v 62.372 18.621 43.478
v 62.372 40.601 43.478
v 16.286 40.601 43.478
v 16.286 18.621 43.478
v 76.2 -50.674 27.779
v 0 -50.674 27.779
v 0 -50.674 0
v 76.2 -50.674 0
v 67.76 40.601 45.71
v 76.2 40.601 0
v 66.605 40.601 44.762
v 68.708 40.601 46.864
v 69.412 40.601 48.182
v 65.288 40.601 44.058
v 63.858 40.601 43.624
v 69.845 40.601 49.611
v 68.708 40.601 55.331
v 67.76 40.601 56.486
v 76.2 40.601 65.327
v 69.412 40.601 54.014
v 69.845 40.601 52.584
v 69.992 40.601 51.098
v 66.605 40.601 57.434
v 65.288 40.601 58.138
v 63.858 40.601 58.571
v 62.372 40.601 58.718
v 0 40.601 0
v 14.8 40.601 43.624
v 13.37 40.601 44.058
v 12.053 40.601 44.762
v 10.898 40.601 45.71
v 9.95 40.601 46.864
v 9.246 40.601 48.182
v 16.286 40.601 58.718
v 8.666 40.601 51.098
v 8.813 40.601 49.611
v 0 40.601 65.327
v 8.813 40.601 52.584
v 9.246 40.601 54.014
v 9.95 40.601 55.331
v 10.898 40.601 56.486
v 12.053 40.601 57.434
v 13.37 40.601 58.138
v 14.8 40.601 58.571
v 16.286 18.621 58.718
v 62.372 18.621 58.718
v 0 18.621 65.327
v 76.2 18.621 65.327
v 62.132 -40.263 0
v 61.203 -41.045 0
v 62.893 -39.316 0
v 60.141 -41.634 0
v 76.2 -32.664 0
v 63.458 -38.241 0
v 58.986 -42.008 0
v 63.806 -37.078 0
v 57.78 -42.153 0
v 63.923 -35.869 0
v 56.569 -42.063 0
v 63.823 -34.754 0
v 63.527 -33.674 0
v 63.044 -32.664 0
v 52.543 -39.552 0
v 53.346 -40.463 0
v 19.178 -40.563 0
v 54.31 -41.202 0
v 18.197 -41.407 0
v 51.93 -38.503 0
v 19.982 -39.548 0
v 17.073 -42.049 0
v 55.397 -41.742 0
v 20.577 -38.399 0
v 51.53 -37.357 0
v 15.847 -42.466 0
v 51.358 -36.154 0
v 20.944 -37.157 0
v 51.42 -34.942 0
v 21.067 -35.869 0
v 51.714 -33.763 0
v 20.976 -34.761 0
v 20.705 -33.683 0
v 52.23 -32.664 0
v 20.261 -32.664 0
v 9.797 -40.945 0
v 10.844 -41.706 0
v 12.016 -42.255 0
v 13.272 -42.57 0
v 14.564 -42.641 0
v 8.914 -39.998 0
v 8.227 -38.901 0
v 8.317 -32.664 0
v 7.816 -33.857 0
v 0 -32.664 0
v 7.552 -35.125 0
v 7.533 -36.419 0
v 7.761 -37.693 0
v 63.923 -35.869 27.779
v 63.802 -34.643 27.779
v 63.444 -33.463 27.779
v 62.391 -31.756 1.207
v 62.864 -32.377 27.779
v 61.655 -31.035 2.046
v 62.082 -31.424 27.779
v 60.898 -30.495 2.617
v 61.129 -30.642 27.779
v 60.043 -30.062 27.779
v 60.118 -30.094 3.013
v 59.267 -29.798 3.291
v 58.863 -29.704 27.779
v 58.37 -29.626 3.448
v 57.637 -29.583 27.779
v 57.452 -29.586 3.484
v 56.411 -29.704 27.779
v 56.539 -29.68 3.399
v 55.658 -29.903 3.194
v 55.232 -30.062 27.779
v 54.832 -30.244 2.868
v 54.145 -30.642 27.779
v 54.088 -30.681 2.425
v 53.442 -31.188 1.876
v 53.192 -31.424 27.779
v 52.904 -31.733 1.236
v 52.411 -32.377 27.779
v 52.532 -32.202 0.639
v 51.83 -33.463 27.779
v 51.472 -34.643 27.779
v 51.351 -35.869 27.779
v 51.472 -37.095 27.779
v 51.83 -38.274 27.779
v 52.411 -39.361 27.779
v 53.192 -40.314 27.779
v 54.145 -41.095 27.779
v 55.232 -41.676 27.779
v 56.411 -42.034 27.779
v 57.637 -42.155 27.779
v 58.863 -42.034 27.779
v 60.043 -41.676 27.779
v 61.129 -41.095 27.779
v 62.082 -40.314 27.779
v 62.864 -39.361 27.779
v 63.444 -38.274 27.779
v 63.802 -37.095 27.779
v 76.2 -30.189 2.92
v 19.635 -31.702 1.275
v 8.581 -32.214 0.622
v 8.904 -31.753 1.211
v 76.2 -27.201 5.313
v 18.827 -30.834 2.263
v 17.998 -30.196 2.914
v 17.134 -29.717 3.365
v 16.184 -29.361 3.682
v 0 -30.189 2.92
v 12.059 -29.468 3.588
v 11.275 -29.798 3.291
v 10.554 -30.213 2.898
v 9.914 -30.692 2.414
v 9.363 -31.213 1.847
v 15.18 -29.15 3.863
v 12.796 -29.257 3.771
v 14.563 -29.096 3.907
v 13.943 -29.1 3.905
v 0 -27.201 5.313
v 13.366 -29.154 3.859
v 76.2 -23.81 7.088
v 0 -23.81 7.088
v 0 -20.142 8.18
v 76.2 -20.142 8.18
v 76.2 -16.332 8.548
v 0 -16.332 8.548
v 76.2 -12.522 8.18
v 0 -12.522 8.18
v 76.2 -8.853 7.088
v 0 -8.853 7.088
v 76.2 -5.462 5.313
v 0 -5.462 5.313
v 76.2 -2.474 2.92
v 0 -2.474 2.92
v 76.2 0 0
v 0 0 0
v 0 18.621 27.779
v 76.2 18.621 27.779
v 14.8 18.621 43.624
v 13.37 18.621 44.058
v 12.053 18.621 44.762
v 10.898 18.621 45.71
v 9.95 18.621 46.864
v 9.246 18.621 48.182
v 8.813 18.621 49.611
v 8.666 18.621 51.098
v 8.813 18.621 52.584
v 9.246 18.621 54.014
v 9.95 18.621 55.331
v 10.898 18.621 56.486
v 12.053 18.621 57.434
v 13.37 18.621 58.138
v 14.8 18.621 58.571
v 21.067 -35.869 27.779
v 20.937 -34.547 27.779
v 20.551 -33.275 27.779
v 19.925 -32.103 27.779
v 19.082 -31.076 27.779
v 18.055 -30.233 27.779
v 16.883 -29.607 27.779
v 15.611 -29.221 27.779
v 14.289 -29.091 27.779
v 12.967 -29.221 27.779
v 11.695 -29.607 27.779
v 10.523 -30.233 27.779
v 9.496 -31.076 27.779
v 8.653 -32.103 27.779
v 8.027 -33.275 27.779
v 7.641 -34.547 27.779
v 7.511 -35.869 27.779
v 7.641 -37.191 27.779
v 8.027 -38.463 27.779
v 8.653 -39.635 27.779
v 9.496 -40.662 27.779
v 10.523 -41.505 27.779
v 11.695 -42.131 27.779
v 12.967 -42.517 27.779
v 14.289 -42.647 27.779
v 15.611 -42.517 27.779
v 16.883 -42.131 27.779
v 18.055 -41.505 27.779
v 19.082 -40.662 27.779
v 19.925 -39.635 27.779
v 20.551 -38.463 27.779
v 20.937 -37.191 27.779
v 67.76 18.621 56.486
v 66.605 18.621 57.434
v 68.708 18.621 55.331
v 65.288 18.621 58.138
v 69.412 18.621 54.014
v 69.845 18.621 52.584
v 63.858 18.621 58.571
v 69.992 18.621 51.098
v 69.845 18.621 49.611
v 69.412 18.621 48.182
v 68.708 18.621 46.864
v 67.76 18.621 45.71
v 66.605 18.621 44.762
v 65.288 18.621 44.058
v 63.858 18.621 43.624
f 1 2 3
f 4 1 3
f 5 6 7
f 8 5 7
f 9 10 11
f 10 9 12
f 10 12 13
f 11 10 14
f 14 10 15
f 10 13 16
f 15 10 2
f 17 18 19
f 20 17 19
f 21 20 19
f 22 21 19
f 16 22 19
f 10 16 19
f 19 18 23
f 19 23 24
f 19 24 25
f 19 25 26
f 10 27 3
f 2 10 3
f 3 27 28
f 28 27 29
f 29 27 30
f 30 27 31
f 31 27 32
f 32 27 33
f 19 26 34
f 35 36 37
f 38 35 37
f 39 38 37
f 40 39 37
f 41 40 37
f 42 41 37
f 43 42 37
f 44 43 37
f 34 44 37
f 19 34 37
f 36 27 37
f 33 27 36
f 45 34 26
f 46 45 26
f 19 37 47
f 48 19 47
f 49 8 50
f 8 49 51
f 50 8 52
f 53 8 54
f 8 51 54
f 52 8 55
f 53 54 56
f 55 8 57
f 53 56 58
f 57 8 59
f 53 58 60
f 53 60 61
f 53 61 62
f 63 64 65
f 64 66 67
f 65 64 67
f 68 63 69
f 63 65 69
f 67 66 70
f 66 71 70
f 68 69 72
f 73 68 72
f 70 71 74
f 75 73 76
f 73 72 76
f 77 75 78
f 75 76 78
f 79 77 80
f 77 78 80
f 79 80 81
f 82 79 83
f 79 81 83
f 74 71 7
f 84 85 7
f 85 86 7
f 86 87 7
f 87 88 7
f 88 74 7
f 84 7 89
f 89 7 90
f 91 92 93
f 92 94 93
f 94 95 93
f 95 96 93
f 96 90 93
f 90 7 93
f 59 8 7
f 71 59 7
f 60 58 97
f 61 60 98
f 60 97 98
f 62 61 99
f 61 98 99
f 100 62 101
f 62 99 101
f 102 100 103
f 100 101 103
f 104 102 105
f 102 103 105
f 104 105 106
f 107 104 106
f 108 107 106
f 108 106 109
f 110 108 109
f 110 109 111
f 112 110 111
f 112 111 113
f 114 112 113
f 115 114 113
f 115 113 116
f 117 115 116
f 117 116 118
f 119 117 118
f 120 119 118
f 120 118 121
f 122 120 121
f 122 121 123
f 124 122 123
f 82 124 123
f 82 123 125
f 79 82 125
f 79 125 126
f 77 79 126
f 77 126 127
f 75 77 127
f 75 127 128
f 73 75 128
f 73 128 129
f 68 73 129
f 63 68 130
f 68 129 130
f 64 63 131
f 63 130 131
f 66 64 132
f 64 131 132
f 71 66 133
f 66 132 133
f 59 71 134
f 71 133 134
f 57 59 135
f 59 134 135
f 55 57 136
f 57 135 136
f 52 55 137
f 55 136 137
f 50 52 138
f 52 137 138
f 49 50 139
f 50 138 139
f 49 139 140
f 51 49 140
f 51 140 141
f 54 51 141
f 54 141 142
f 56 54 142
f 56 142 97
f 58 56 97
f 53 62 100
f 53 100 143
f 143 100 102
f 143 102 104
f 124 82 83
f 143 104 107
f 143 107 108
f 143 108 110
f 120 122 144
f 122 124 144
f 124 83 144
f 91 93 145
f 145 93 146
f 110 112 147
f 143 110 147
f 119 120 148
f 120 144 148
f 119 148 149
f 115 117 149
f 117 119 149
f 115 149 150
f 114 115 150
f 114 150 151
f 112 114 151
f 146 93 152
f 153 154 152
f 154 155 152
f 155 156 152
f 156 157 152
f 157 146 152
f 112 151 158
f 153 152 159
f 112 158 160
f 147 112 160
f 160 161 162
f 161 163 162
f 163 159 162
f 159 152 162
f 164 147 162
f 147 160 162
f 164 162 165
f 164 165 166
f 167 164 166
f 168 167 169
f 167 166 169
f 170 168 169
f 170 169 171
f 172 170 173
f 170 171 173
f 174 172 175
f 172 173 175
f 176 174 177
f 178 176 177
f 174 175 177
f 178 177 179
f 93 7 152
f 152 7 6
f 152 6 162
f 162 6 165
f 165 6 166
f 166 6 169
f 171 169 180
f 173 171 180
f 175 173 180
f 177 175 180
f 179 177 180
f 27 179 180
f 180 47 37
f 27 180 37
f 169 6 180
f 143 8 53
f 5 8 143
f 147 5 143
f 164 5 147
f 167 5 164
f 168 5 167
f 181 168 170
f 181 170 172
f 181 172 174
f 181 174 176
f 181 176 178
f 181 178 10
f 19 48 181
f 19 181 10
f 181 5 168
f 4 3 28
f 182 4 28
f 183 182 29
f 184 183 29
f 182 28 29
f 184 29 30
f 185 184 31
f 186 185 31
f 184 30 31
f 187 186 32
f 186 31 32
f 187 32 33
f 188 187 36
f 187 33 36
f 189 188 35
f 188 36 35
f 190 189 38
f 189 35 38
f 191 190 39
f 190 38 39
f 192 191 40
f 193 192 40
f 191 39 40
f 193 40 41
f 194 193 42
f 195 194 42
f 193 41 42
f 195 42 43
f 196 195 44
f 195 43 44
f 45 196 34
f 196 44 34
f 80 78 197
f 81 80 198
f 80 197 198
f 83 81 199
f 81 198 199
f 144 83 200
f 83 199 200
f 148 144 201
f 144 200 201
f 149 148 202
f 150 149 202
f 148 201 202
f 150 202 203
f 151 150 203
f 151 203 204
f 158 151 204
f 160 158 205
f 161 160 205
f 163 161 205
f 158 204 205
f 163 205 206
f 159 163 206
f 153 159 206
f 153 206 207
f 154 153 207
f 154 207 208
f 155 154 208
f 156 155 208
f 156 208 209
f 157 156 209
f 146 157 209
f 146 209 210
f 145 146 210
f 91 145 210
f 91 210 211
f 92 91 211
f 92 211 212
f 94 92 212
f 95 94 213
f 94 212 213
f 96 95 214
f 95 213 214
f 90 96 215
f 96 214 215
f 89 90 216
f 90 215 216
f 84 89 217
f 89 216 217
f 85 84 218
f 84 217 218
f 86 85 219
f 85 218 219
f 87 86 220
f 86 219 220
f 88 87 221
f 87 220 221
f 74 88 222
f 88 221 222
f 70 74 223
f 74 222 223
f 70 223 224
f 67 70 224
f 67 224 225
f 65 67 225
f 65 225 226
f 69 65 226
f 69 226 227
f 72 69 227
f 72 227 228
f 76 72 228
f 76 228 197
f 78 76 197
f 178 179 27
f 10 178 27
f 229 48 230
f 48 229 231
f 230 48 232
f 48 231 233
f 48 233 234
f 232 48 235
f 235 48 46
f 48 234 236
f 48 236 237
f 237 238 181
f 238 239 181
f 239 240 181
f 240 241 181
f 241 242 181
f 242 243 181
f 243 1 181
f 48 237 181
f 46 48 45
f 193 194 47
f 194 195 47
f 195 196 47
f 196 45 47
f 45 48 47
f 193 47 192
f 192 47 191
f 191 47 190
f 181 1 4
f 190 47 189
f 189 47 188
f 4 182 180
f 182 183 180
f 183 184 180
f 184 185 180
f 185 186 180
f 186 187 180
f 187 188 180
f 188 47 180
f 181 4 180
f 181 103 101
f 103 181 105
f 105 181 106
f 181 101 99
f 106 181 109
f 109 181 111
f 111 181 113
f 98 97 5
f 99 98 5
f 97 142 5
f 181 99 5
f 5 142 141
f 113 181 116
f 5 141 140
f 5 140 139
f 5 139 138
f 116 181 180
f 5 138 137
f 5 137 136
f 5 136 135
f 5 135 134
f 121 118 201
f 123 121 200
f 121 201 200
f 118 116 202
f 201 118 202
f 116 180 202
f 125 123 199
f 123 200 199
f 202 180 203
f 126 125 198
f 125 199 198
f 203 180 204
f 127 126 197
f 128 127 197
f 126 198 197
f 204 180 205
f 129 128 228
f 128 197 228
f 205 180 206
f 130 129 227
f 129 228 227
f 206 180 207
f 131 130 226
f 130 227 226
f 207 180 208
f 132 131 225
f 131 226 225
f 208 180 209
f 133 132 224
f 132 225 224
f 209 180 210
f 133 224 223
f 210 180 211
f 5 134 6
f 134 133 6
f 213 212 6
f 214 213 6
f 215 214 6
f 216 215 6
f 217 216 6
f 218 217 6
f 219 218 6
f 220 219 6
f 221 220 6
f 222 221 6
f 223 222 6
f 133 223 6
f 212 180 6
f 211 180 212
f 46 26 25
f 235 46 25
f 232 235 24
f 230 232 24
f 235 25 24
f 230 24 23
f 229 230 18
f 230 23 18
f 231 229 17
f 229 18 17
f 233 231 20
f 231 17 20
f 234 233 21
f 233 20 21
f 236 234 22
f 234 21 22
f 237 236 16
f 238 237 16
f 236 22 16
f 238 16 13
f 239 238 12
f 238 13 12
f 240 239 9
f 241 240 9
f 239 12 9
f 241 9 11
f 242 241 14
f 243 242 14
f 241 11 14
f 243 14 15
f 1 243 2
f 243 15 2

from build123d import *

# Parameters (mm, degrees)
F1_DEPTH = 76.2
F2_R     = 6.778033
F2_R_2   = 6.285837
F3_DEPTH = 63.246
F5_DEPTH = 25.4


with BuildPart() as f1:
    # F0 (on Right) → F1 (new body)
    with BuildSketch(Plane.YZ):
        with BuildLine():
            ThreePointArc((-32.663602, 0), (-16.331801, 8.548074), (0, 0))
            Line((0, 0), (18.621311, 0))
            Line((18.621311, 0), (40.600557, 0))
            Line((40.600557, 0), (40.600557, 65.327212))
            Line((40.600557, 65.327212), (18.621311, 65.327212))
            Line((18.621311, 65.327212), (18.621311, 27.779331))
            Line((18.621311, 27.779331), (-50.674375, 27.779331))
            Line((-50.674375, 27.779331), (-50.674375, 0))
            Line((-50.674375, 0), (-32.663602, 0))
        make_face()
    extrude(amount=F1_DEPTH)

    # F2 (on face) → F3 (cut)
    with BuildSketch(Plane.XY.offset(27.779331)):
        with Locations((14.289155, -35.868905)):
            Circle(F2_R)
        with Locations((57.637118, -35.868905)):
            Circle(F2_R_2)
    extrude(amount=-F3_DEPTH, mode=Mode.SUBTRACT)

    # F4 (on face) → F5 (cut)
    with BuildSketch(Plane(origin=(0, 40.600557, 0), x_dir=(-1, 0, 0), z_dir=(0, 1, 0))):
        with BuildLine():
            Line((-16.286157, 58.71784), (-62.371738, 58.71784))
            ThreePointArc((-62.371738, 58.71784), (-69.991738, 51.09784), (-62.371738, 43.47784))
            Line((-62.371738, 43.47784), (-16.286157, 43.47784))
            ThreePointArc((-16.286157, 43.47784), (-8.666157, 51.09784), (-16.286157, 58.71784))
        make_face()
    extrude(amount=-F5_DEPTH, mode=Mode.SUBTRACT)


solid = f1.part
